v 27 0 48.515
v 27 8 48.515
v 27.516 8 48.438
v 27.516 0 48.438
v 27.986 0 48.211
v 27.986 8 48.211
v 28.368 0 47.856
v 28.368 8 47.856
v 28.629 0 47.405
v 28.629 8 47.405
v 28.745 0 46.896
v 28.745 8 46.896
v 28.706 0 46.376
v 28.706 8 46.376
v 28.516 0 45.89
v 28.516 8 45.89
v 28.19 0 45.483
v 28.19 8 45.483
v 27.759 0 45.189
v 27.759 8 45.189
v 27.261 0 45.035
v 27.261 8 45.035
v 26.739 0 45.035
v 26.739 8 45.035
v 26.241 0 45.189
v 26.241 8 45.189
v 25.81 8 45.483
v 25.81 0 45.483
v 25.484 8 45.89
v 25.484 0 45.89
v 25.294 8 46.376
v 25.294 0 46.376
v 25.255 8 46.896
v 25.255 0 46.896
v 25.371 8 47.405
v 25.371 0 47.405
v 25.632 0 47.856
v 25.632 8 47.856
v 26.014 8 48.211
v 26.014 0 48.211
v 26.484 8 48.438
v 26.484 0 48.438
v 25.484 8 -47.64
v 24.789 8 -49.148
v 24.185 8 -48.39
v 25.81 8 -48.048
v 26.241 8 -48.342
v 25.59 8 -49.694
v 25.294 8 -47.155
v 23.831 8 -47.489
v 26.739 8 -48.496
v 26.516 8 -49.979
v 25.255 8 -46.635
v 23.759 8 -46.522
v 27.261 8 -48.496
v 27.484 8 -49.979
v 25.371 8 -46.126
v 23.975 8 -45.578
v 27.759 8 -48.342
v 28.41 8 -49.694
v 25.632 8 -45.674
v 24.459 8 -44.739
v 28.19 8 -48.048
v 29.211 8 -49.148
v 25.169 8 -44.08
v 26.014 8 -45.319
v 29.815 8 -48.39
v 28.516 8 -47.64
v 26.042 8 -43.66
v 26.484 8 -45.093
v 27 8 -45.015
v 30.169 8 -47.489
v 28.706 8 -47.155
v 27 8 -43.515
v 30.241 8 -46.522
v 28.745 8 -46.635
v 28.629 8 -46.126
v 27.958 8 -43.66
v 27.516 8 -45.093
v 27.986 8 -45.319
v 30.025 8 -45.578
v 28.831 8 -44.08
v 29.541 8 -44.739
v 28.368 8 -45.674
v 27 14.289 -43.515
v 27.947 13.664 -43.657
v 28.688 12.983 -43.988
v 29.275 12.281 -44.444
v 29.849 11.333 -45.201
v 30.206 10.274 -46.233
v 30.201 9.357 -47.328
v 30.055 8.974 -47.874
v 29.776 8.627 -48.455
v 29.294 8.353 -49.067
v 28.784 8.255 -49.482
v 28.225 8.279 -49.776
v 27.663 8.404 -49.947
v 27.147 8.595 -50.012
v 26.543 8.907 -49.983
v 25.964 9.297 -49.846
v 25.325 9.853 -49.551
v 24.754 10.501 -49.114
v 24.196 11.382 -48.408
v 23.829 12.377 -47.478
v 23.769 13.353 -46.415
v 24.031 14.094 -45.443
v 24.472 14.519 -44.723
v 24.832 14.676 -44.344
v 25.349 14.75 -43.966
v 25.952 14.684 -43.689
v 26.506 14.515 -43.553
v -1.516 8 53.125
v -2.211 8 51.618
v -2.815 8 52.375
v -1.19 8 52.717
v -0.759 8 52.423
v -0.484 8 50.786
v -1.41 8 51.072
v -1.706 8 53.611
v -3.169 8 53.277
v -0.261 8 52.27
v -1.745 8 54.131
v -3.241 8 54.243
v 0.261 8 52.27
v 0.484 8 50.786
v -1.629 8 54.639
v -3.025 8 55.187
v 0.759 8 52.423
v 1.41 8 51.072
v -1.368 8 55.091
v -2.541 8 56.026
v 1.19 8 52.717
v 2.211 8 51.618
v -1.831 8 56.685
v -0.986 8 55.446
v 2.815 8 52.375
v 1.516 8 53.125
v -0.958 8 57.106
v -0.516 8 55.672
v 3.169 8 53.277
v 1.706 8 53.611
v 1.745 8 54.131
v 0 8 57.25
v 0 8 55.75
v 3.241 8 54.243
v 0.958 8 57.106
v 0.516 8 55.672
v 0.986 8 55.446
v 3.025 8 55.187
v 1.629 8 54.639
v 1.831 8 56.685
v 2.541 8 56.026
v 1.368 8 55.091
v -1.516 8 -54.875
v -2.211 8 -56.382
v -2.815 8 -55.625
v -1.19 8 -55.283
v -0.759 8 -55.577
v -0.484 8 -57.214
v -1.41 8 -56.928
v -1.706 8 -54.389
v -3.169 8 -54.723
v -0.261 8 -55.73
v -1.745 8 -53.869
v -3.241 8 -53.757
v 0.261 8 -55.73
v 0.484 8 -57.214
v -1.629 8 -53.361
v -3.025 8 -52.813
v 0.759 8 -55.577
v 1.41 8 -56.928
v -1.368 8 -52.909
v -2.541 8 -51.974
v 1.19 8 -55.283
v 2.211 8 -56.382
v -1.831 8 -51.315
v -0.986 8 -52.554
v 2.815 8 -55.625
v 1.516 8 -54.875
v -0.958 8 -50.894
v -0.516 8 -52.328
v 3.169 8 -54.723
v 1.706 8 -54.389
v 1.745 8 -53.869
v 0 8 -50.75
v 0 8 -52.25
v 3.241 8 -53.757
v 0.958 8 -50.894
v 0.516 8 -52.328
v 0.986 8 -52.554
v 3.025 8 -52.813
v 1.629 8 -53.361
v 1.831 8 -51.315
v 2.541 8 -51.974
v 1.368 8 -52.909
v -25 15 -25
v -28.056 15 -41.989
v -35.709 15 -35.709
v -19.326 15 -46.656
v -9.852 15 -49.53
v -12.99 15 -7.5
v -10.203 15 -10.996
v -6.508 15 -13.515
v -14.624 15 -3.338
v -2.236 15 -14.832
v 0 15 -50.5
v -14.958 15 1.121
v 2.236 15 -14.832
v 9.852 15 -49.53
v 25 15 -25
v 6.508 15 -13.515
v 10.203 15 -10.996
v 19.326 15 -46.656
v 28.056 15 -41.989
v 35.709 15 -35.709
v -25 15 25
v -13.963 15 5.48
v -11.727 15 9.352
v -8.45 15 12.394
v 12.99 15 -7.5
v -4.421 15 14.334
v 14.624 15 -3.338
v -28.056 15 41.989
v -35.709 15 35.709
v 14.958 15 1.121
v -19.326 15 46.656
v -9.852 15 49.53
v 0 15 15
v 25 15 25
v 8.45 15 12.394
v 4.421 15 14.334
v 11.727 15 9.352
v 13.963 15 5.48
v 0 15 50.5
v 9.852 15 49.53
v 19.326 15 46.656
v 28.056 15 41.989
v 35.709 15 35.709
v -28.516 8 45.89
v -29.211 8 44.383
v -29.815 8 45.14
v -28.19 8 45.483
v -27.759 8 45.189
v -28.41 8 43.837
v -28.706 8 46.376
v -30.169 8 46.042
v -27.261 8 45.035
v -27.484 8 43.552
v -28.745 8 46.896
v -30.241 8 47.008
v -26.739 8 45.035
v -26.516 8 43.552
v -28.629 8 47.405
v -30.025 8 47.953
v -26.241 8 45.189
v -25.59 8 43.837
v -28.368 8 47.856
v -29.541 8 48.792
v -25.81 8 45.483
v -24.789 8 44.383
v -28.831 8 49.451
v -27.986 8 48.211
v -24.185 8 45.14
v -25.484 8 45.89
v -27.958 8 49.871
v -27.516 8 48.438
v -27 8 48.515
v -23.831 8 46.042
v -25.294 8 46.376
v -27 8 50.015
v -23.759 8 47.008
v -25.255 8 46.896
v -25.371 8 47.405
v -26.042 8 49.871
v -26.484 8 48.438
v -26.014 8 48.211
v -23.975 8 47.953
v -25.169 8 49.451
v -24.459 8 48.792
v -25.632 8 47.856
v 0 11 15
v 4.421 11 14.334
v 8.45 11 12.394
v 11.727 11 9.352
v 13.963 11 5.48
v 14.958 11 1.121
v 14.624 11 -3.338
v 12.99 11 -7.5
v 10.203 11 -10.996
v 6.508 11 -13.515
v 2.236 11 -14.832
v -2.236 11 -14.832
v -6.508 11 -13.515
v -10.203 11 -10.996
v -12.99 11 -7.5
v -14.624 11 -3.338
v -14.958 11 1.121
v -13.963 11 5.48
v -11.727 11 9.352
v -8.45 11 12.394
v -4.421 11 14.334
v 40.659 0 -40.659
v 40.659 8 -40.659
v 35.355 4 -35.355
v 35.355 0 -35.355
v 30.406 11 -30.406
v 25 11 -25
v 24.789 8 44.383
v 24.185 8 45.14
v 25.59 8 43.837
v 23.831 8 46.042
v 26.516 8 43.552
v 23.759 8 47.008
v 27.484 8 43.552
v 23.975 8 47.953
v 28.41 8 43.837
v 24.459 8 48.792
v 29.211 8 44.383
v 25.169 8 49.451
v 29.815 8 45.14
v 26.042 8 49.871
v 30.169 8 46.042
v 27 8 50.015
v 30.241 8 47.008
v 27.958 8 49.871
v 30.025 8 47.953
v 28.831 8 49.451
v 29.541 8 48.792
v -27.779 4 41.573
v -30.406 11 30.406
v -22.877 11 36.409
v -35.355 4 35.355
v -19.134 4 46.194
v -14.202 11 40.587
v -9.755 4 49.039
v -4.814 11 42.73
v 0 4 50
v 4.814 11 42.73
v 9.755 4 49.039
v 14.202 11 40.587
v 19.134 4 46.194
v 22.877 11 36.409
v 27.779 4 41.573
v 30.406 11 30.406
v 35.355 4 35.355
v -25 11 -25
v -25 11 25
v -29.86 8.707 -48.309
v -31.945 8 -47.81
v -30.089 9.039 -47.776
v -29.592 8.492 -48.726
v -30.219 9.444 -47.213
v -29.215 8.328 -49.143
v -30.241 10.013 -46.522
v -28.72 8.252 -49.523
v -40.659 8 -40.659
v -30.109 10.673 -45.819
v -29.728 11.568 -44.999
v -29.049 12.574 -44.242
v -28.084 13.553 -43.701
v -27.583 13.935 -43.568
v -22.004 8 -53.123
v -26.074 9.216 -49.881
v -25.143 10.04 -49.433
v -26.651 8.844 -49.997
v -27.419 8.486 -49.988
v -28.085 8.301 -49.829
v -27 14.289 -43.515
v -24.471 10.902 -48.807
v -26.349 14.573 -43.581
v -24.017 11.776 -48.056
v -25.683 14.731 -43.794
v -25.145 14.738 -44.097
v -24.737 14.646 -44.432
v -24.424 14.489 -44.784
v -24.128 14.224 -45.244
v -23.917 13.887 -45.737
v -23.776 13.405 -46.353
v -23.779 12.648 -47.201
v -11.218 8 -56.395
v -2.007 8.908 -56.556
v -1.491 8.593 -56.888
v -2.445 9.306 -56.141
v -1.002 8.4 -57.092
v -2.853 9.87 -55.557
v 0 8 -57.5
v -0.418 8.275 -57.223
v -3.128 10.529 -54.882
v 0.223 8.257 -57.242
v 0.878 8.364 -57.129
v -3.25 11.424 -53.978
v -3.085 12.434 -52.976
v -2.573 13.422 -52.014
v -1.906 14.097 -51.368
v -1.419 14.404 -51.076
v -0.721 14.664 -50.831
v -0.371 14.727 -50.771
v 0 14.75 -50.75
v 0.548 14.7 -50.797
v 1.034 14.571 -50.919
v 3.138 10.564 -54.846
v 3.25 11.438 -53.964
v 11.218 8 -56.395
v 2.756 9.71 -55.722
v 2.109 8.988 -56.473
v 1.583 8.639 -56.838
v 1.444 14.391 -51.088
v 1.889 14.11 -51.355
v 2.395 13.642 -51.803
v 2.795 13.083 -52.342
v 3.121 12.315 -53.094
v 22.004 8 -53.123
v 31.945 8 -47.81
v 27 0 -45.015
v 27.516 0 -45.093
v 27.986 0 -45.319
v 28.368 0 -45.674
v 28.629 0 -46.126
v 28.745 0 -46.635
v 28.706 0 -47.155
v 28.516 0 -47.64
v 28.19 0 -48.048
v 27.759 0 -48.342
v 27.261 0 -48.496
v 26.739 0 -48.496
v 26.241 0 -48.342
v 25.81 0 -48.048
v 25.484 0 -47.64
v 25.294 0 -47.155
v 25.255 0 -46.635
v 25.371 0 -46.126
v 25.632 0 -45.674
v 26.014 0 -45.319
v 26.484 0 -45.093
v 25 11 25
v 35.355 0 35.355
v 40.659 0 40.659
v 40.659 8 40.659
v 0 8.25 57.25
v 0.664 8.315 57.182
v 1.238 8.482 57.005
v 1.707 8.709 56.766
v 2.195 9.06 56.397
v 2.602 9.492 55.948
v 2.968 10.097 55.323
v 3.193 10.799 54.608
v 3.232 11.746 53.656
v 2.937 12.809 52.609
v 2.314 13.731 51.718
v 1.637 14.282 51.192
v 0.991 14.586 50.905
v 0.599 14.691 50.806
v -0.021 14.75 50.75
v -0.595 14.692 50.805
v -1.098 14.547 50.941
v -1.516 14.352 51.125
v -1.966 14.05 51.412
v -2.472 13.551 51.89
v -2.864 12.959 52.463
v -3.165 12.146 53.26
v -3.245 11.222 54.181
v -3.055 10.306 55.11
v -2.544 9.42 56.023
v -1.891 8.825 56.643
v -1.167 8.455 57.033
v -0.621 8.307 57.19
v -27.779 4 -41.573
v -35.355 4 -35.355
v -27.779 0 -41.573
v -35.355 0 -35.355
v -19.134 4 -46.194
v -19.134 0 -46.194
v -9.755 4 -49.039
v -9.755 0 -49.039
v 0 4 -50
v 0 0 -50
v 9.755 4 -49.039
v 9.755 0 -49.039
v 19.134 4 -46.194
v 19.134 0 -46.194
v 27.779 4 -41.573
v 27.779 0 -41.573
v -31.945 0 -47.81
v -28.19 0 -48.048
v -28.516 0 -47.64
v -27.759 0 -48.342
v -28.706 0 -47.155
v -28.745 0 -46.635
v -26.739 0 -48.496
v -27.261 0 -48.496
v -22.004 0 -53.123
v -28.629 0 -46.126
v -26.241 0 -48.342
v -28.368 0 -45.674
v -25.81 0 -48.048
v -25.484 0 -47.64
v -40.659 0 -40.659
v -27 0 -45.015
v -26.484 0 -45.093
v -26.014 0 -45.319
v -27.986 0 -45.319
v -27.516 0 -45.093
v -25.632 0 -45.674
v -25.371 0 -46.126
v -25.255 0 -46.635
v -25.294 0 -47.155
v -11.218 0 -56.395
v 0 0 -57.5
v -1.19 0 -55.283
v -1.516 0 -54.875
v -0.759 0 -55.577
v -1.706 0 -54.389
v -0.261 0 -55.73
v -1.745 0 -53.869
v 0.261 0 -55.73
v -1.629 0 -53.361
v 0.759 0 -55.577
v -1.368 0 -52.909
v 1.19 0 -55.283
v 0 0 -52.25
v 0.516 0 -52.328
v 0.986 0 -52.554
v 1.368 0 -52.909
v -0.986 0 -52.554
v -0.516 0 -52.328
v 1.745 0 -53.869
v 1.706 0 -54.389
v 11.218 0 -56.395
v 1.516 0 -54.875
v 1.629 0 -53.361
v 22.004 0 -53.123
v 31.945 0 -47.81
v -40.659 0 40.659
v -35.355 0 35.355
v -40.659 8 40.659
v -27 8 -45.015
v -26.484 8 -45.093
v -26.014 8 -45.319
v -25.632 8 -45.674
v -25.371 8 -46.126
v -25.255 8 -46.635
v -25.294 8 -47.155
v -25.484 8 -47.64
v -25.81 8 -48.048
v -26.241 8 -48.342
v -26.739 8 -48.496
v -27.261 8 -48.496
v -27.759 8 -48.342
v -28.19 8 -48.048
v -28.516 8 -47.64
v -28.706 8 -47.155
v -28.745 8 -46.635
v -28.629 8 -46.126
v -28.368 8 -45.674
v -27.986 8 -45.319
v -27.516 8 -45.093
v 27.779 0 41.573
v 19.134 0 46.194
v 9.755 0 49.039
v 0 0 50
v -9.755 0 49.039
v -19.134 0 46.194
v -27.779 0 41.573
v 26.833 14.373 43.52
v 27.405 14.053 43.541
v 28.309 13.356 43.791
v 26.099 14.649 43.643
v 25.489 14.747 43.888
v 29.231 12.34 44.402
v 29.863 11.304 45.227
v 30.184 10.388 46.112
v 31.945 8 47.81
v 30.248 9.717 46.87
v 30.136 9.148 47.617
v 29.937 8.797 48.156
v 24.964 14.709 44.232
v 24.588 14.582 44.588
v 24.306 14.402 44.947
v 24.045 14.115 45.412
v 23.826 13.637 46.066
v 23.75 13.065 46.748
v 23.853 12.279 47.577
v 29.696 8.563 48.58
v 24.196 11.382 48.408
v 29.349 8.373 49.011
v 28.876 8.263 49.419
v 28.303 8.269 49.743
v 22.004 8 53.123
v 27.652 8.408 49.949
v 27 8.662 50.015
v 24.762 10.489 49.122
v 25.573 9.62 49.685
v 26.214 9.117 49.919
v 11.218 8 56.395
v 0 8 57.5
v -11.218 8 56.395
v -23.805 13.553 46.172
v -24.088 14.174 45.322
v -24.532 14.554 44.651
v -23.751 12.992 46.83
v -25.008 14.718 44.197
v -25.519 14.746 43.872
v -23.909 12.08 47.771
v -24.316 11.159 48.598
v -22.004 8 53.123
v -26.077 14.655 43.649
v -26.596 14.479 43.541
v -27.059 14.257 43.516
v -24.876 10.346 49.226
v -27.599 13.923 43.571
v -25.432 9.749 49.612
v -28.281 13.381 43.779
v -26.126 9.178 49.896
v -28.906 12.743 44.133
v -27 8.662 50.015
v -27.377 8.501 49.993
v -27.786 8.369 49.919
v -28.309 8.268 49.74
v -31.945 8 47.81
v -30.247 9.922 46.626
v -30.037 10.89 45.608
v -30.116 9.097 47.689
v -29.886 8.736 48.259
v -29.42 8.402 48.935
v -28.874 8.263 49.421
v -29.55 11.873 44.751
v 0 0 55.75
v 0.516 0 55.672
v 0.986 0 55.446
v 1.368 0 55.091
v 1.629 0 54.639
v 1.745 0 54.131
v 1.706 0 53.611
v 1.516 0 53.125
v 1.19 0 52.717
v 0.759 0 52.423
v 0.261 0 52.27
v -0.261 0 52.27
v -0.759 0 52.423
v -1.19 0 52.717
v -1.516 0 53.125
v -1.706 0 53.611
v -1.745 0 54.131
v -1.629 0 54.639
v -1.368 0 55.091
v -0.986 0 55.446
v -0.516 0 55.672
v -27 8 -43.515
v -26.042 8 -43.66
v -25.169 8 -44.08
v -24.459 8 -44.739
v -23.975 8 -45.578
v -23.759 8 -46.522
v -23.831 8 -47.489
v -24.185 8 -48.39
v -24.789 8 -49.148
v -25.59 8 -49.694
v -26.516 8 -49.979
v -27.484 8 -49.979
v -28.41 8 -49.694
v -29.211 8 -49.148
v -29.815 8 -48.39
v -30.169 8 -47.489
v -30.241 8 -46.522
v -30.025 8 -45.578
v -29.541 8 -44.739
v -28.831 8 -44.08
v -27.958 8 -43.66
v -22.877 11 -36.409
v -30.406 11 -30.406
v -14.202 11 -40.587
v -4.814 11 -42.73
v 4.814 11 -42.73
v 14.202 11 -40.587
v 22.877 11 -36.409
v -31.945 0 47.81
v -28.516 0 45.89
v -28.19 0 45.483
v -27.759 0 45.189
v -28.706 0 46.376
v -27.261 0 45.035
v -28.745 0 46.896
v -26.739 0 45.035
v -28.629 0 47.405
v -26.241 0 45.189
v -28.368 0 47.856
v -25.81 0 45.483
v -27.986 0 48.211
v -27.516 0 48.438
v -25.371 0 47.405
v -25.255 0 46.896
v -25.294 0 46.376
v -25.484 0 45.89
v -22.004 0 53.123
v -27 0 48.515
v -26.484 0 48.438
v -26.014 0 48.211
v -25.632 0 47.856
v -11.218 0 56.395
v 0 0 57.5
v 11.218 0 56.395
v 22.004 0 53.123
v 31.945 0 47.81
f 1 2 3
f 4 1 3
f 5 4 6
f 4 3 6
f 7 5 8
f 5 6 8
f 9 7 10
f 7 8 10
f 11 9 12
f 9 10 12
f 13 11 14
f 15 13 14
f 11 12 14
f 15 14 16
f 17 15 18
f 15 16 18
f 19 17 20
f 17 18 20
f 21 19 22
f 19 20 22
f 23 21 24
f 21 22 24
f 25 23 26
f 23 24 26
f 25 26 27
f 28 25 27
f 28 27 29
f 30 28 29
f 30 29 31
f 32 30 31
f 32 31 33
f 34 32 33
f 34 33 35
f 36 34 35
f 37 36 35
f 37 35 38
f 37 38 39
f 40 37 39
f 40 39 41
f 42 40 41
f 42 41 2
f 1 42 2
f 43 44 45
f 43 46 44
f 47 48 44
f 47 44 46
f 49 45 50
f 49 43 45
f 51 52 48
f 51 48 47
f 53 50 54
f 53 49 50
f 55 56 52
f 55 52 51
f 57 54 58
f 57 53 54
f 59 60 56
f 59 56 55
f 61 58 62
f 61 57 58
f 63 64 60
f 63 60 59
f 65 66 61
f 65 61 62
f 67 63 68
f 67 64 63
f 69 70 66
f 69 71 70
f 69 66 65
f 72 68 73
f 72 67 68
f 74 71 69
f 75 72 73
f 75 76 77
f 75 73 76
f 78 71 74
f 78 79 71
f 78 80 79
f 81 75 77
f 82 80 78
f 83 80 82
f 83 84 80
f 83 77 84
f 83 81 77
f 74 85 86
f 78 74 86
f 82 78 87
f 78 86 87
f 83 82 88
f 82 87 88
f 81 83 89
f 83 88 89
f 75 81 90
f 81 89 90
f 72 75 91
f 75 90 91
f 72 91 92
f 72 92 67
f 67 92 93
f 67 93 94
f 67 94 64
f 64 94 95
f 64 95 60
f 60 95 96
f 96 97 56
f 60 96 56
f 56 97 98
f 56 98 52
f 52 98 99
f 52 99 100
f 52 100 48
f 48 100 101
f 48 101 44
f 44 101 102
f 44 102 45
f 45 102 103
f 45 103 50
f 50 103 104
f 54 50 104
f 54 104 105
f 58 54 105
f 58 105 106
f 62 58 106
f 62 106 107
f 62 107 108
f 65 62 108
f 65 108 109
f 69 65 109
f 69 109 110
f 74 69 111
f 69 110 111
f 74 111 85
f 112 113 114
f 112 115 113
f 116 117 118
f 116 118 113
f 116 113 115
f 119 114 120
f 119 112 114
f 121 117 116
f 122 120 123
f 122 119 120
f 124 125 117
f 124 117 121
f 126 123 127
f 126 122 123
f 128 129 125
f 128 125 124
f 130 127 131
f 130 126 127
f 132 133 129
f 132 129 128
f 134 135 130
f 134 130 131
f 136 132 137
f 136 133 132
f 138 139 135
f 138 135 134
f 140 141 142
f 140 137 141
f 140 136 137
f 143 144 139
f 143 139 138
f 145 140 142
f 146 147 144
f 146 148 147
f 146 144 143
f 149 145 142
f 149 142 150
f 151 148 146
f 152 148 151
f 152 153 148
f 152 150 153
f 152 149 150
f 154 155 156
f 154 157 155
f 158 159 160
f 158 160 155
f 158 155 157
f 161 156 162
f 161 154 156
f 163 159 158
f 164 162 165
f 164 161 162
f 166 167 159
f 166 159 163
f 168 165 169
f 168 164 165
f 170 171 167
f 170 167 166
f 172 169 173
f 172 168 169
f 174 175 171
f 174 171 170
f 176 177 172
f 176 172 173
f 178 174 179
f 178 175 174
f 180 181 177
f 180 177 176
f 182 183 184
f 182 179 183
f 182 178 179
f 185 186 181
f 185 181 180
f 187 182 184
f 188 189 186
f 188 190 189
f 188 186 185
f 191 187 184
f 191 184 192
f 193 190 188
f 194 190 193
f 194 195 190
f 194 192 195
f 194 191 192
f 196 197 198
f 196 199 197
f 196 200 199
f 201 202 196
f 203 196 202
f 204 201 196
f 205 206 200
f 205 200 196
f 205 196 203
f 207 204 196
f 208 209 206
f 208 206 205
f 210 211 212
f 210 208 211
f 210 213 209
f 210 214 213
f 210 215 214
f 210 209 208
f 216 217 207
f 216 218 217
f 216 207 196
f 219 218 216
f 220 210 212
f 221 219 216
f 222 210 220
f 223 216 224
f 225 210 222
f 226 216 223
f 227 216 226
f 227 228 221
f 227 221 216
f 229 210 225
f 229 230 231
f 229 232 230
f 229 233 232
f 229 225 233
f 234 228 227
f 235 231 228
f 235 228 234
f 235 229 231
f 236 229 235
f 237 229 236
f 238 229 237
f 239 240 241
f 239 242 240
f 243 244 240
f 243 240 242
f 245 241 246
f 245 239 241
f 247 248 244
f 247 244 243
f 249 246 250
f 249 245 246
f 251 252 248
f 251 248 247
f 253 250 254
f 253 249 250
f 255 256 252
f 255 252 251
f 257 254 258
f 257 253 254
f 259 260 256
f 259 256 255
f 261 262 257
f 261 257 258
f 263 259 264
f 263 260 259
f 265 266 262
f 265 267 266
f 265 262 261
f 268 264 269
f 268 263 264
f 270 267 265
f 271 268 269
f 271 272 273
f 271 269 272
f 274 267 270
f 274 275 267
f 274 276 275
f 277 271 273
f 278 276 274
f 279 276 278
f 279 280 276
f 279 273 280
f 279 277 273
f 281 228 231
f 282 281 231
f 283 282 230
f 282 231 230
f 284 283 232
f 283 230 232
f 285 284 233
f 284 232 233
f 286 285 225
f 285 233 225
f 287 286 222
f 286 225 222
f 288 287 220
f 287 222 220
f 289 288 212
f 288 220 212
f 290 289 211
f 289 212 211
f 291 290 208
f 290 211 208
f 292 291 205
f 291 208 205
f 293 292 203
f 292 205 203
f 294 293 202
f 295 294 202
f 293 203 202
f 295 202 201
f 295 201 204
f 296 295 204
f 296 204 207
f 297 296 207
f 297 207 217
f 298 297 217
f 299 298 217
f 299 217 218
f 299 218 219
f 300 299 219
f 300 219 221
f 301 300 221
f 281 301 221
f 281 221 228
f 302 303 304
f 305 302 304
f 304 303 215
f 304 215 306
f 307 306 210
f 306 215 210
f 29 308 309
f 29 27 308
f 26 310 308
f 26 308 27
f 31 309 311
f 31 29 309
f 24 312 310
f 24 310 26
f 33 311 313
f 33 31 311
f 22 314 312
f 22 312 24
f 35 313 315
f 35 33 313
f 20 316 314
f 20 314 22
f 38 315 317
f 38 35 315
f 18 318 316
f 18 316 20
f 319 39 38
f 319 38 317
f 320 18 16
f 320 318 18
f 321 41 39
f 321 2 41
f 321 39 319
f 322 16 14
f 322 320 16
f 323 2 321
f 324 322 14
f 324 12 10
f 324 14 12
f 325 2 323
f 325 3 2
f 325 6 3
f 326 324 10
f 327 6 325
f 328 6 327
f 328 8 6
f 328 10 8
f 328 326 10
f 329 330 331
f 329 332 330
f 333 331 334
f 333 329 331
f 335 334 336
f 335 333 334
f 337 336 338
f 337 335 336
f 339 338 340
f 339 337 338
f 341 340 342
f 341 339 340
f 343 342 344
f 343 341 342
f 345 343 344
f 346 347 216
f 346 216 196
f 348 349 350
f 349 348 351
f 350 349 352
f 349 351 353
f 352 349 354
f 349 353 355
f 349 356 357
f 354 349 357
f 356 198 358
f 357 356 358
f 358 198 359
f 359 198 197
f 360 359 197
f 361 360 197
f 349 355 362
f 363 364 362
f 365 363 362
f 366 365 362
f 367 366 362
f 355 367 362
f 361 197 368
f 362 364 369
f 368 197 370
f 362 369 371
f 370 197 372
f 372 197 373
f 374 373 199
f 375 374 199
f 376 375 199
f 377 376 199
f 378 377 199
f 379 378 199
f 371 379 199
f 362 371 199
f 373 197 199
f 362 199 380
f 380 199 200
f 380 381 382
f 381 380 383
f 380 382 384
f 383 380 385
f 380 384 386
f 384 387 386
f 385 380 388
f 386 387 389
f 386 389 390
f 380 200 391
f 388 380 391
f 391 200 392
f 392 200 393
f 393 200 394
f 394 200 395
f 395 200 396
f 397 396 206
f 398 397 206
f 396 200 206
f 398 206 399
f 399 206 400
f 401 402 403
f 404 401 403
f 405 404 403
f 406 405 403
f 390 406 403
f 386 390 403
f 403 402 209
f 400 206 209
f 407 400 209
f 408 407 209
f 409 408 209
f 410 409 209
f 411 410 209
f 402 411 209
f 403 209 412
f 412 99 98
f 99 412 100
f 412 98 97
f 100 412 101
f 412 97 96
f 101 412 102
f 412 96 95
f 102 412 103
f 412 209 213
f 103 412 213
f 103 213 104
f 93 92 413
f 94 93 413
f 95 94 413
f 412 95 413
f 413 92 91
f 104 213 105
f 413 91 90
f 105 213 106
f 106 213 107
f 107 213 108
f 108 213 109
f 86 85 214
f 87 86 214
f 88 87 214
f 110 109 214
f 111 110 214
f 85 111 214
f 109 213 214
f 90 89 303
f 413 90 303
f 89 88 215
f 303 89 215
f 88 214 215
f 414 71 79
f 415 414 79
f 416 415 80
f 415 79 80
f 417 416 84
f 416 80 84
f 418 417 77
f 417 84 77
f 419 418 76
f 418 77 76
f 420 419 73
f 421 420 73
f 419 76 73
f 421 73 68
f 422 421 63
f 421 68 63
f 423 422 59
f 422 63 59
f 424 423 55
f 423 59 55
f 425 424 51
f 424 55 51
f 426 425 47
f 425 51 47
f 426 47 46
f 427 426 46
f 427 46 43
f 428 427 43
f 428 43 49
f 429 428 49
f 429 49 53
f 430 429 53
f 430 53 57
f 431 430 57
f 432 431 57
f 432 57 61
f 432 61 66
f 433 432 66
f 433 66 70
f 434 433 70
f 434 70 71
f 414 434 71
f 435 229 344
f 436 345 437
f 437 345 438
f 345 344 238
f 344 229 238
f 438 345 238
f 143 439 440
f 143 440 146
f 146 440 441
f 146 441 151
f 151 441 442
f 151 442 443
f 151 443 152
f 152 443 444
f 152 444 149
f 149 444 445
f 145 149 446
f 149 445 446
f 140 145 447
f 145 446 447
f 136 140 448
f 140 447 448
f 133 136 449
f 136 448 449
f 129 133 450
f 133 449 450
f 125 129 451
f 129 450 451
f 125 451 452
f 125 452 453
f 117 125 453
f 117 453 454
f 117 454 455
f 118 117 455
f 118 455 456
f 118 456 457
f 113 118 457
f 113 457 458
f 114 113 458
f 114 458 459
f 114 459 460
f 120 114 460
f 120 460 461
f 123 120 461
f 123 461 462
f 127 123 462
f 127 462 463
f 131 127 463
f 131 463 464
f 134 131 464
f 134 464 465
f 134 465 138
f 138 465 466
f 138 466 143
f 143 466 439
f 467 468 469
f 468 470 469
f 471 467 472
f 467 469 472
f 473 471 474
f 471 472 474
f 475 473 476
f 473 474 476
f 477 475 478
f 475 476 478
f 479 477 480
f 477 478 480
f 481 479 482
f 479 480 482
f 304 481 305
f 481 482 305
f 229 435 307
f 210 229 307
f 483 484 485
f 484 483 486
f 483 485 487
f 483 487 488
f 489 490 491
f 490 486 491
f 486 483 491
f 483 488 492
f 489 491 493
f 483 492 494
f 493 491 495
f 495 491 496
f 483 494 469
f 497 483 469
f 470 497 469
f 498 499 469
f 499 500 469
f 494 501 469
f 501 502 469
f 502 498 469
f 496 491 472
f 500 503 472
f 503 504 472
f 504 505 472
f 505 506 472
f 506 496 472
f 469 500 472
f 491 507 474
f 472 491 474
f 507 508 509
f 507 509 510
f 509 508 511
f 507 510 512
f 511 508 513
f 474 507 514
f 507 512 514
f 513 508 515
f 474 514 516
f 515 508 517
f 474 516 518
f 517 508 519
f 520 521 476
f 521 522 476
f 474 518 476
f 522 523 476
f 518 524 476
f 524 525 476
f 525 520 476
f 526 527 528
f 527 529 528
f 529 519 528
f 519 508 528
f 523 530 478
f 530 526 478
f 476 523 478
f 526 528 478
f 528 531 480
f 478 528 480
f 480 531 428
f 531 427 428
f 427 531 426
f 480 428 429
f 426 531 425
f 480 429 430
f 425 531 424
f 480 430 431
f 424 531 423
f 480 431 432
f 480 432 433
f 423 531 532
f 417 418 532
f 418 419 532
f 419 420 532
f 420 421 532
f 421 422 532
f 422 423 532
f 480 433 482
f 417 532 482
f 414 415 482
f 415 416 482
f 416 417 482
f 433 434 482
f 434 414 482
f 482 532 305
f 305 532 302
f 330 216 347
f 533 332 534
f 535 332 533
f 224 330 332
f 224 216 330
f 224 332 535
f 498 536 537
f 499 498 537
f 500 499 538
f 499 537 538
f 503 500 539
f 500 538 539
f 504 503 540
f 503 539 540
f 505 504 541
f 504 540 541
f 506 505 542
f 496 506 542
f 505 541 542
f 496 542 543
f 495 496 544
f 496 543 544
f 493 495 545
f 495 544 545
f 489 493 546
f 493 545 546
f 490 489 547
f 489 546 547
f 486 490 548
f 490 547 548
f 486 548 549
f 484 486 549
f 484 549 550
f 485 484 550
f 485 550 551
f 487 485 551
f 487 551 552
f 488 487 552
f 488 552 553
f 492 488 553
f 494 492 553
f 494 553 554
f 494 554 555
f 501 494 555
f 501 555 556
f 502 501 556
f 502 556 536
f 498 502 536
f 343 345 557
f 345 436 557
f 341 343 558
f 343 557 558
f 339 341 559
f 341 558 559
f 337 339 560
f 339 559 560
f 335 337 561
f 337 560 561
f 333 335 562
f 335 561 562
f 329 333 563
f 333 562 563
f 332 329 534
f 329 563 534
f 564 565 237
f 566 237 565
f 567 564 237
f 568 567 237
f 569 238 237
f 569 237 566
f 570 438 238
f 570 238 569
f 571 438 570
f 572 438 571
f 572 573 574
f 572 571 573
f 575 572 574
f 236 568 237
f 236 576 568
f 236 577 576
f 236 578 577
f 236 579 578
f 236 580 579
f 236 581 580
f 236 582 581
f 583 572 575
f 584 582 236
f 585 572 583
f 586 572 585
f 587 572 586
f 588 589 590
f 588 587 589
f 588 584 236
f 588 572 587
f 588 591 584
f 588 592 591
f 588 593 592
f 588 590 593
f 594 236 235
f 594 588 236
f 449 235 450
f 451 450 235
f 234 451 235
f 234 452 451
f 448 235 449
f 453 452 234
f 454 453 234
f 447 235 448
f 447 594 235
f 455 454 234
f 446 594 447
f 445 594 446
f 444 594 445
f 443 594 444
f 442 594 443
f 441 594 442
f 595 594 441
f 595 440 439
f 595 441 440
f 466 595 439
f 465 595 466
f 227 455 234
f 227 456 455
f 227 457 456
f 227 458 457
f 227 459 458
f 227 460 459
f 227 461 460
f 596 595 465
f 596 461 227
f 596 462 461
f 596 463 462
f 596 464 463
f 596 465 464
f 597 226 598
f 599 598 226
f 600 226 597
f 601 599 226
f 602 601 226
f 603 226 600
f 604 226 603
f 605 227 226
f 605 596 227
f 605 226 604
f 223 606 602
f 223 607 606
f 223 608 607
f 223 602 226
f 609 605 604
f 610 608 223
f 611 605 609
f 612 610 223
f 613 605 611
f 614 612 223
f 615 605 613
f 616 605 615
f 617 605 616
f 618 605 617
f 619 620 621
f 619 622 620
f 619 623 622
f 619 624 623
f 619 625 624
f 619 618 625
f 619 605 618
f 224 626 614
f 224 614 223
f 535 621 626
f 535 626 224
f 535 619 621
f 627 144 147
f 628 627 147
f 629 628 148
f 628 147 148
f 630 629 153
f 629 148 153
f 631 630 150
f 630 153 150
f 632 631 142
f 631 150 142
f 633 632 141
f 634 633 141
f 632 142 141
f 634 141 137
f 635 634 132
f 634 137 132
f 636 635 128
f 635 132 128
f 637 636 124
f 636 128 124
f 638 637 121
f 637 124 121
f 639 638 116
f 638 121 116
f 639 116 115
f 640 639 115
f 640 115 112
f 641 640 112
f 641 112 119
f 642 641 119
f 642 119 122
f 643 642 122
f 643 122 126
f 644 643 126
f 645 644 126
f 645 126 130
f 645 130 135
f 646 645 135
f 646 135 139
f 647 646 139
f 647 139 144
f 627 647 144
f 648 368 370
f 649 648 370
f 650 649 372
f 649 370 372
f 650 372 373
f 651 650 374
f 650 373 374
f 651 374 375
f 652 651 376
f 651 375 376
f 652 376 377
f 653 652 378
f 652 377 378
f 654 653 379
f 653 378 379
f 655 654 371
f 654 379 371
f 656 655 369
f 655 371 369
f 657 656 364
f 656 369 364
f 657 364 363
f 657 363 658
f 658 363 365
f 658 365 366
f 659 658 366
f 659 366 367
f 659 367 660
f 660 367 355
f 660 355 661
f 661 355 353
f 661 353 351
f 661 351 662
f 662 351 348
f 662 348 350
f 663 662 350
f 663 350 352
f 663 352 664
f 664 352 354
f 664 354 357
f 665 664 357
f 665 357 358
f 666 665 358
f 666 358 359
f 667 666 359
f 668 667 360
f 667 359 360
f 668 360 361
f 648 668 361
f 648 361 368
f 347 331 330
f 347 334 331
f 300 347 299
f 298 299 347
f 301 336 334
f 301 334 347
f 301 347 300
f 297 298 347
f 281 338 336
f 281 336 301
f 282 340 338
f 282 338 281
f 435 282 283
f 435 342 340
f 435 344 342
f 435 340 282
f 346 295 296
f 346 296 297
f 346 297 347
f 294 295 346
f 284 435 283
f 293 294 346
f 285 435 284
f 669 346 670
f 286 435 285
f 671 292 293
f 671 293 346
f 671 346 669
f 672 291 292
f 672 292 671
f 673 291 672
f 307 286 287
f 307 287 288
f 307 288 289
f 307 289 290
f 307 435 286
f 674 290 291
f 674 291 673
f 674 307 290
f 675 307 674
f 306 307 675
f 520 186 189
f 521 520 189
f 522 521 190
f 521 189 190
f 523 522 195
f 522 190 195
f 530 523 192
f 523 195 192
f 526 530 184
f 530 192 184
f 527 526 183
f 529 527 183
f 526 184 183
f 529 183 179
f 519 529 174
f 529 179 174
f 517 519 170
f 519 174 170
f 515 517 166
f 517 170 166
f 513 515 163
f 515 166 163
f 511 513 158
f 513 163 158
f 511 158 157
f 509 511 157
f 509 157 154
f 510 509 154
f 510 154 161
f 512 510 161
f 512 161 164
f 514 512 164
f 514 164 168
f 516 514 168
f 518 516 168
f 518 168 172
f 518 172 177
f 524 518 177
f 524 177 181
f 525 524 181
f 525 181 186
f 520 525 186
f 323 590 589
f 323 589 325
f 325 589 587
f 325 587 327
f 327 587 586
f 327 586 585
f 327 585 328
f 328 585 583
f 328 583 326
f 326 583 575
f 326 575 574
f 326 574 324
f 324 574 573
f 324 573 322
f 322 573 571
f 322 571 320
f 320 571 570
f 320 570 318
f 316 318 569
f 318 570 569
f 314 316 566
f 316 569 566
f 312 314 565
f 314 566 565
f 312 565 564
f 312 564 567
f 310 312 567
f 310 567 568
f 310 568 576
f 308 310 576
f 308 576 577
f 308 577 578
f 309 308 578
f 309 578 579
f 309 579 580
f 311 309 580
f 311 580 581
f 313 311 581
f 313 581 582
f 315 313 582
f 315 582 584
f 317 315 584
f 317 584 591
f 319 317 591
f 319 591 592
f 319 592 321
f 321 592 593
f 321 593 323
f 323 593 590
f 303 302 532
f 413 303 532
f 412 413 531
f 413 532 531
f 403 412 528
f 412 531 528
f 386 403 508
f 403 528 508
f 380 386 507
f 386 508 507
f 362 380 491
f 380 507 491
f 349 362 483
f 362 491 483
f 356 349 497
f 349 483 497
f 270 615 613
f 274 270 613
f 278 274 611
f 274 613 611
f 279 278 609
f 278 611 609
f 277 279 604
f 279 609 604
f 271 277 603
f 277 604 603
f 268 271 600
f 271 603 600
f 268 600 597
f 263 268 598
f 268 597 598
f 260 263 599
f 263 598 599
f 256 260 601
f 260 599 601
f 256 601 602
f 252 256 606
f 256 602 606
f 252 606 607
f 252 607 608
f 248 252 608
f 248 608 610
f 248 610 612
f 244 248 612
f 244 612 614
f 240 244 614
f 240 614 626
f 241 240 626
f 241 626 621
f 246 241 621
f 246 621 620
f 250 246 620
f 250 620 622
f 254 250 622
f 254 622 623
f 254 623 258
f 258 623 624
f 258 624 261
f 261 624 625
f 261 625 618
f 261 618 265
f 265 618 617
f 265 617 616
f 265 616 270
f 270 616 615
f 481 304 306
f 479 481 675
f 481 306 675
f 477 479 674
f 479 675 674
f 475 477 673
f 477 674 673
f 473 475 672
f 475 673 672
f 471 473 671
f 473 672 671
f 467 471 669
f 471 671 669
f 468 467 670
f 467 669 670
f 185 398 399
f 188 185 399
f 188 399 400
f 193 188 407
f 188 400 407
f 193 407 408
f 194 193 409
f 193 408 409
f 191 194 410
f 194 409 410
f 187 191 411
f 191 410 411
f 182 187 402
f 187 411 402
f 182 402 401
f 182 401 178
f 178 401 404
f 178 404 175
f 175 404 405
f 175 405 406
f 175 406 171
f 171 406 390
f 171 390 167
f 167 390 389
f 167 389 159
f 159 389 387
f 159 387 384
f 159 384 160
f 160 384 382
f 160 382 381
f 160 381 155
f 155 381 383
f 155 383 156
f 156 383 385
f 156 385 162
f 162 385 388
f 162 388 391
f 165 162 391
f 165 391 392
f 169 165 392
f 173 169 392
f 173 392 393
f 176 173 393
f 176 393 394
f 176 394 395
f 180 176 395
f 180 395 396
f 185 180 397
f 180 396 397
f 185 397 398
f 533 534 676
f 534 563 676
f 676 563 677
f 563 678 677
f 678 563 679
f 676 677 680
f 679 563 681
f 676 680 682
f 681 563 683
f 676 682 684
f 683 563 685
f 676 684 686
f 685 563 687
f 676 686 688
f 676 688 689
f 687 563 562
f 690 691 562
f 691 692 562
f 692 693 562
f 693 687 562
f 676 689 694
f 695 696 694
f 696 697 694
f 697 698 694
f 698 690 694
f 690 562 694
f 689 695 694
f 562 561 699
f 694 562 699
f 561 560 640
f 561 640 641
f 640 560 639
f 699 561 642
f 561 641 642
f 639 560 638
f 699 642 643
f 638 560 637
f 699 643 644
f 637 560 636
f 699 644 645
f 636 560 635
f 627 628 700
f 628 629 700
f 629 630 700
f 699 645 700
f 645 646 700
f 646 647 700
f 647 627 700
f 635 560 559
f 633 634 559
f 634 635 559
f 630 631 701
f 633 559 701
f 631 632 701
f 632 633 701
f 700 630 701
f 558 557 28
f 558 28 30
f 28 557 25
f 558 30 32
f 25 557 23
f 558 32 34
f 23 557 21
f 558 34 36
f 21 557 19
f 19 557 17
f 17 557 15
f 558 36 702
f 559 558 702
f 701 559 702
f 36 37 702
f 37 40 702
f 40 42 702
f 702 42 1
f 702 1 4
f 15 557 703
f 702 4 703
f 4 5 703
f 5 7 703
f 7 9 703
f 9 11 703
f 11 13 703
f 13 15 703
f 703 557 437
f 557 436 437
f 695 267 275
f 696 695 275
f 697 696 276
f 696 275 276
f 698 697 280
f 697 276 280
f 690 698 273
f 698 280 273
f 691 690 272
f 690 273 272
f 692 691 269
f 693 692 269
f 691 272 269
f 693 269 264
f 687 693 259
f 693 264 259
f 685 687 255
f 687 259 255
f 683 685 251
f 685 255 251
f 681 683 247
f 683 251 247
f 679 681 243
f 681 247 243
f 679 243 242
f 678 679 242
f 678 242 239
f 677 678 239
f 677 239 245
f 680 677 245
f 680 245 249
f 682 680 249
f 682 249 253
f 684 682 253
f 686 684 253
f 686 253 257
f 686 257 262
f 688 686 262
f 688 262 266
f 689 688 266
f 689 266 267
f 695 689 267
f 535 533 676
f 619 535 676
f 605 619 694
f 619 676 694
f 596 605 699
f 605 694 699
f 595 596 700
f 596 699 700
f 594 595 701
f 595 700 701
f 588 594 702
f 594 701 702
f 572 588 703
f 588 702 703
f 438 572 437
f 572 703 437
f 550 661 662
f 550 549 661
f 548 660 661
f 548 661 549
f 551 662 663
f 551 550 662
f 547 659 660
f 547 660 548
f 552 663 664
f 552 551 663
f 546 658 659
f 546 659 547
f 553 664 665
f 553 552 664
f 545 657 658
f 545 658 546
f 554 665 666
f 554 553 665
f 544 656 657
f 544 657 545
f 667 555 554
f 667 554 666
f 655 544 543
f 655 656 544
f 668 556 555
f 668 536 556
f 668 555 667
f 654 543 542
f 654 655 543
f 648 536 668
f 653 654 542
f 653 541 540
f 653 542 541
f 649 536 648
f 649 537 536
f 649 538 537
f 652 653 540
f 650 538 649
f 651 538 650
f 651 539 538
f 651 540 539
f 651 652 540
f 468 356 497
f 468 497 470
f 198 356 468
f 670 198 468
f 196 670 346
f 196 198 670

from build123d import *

# Parameters (mm, degrees)
SKETCH1_R           = 57.5
BOSS_EXTRUDE1_DEPTH = 15
SKETCH2_R           = 50
CUT_EXTRUDE1_DEPTH  = 11
SKETCH3_R           = 1.75
SKETCH3_R_2         = 15
CUT_EXTRUDE2_DEPTH  = 15
CUT_EXTRUDE3_START  = -15
CUT_EXTRUDE3_DEPTH  = 15
CHAMFER1_SIZE       = 7
SKETCH5_R           = 3.25
CUT_EXTRUDE4_DEPTH  = 7


with BuildPart() as part:
    # Sketch1 → Boss-Extrude1 (new body)
    with BuildSketch(Plane(origin=(0, 0, 0), x_dir=(1, 0, 0), z_dir=(0, 1, 0))):
        with Locations(Location((0, 0, 0), (0, 0, 270))):
            Circle(SKETCH1_R)
    extrude(amount=BOSS_EXTRUDE1_DEPTH)

    # Sketch2 → Cut-Extrude1 (cut)
    with BuildSketch(Plane.XZ):
        with Locations(Location((0, 0, 0), (0, 0, 270))):
            Circle(SKETCH2_R)
    extrude(amount=-CUT_EXTRUDE1_DEPTH, mode=Mode.SUBTRACT)

    # Sketch3 → Cut-Extrude2 (cut)
    with BuildSketch(Plane(origin=(0, 15, 0), x_dir=(1, 0, 0), z_dir=(0, 1, 0))):
        with Locations(Location((0, 54, 0), (0, 0, 270))):
            Circle(SKETCH3_R)
        with Locations(Location((27, 46.765371804, 0), (0, 0, 270))):
            Circle(SKETCH3_R)
        with Locations(Location((46.765371804, 27, 0), (0, 0, 270))):
            Circle(SKETCH3_R)
        with Locations(Location((54, 0, 0), (0, 0, 270))):
            Circle(SKETCH3_R)
        with Locations(Location((46.765371804, -27, 0), (0, 0, 270))):
            Circle(SKETCH3_R)
        with Locations(Location((27, -46.765371804, 0), (0, 0, 270))):
            Circle(SKETCH3_R)
        with Locations(Location((0, -54, 0), (0, 0, 270))):
            Circle(SKETCH3_R)
        with Locations(Location((-27, -46.765371804, 0), (0, 0, 270))):
            Circle(SKETCH3_R)
        with Locations(Location((-46.765371804, -27, 0), (0, 0, 270))):
            Circle(SKETCH3_R)
        with Locations(Location((-54, 0, 0), (0, 0, 270))):
            Circle(SKETCH3_R)
        with Locations(Location((-46.765371804, 27, 0), (0, 0, 270))):
            Circle(SKETCH3_R)
        with Locations(Location((-27, 46.765371804, 0), (0, 0, 270))):
            Circle(SKETCH3_R)
        with Locations(Location((0, 0, 0), (0, 0, 270))):
            Circle(SKETCH3_R_2)
    extrude(amount=-CUT_EXTRUDE2_DEPTH, mode=Mode.SUBTRACT)

    # Sketch4 → Cut-Extrude3 (cut)
    with BuildSketch(Plane(origin=(0, 15, 0), x_dir=(1, 0, 0), z_dir=(0, 1, 0)).offset(CUT_EXTRUDE3_START)):
        with BuildLine():
            Line((25, 25), (40.658639918, 40.658639918))
            ThreePointArc((40.658639918, 40.658639918), (57.5, 0), (40.658639918, -40.658639918))
            Line((40.658639918, -40.658639918), (25, -25))
            Line((25, -25), (25, 25))
        make_face()
    cut_extrude3 = extrude(amount=CUT_EXTRUDE3_DEPTH, mode=Mode.SUBTRACT)

    # Mirror1: Cut-Extrude3 across plane
    add(cut_extrude3.mirror(Plane(origin=(0, 0, 0), x_dir=(0, 0, 1), z_dir=(1, 0, 0))), mode=Mode.SUBTRACT)

    # Chamfer1
    # the kernel refuses this chamfer: 7 mm, written as the material it adds along each edge
    with BuildSketch(Plane(origin=(0, 11, 0), x_dir=(-0.7071067811865476, 0, 0.7071067811865476), z_dir=(-0.7071067811865476, 0, -0.7071067811865476))) as chamfer1_piece_1:
        Polygon((50 - CHAMFER1_SIZE, 0), (50, -CHAMFER1_SIZE), (50, 0), align=None)
    revolve(axis=Axis((0, 11, 0), (0, 1, 0)), revolution_arc=90)
    with BuildSketch(Plane(origin=(0, 11, 0), x_dir=(0.7071067811865475, 0, -0.7071067811865477), z_dir=(0.7071067811865477, 0, 0.7071067811865475))) as chamfer1_piece_2:
        Polygon((50, -CHAMFER1_SIZE), (50 - CHAMFER1_SIZE, 0), (50, 0), align=None)
    revolve(axis=Axis((0, 11, 0), (0, 1, 0)), revolution_arc=90)
    # the kernel refuses this chamfer: 7 mm, written as the material it takes off along each edge
    with BuildSketch(Plane(origin=(0, 15, 0), x_dir=(-0.890570714861766, 0, -0.4548448107108656), z_dir=(-0.4548448107108656, 0, 0.890570714861766))) as chamfer1_2_piece_1:
        Polygon((57.5, CHAMFER1_SIZE), (57.5 - CHAMFER1_SIZE, 0), (57.5, 0), align=None)
    revolve(axis=Axis((0, 15, 0), (0, -1, 0)), revolution_arc=125.890100955, mode=Mode.SUBTRACT)
    with BuildSketch(Plane(origin=(0, 15, 0), x_dir=(0.890570714861766, 0, 0.4548448107108656), z_dir=(0.4548448107108656, 0, -0.890570714861766))) as chamfer1_2_piece_2:
        Polygon((57.5 - CHAMFER1_SIZE, 0), (57.5, CHAMFER1_SIZE), (57.5, 0), align=None)
    revolve(axis=Axis((0, 15, 0), (0, -1, 0)), revolution_arc=125.890100955, mode=Mode.SUBTRACT)

    # Sketch5 → Cut-Extrude4 (cut)
    with BuildSketch(Plane(origin=(0, 15, 0), x_dir=(1, 0, 0), z_dir=(0, 1, 0))):
        with Locations(Location((0, 54, 0), (0, 0, 270))):
            Circle(SKETCH5_R)
        with Locations(Location((27, 46.765371804, 0), (0, 0, 270))):
            Circle(SKETCH5_R)
        with Locations((46.765371804, 27)):
            Circle(SKETCH5_R)
        with Locations((54, 0)):
            Circle(SKETCH5_R)
        with Locations((46.765371804, -27)):
            Circle(SKETCH5_R)
        with Locations(Location((27, -46.765371804, 0), (0, 0, 270))):
            Circle(SKETCH5_R)
        with Locations(Location((0, -54, 0), (0, 0, 270))):
            Circle(SKETCH5_R)
        with Locations(Location((-27, -46.765371804, 0), (0, 0, 270))):
            Circle(SKETCH5_R)
        with Locations((-46.765371804, -27)):
            Circle(SKETCH5_R)
        with Locations((-54, 0)):
            Circle(SKETCH5_R)
        with Locations((-46.765371804, 27)):
            Circle(SKETCH5_R)
        with Locations(Location((-27, 46.765371804, 0), (0, 0, 270))):
            Circle(SKETCH5_R)
    extrude(amount=-CUT_EXTRUDE4_DEPTH, mode=Mode.SUBTRACT)


solid = part.part
